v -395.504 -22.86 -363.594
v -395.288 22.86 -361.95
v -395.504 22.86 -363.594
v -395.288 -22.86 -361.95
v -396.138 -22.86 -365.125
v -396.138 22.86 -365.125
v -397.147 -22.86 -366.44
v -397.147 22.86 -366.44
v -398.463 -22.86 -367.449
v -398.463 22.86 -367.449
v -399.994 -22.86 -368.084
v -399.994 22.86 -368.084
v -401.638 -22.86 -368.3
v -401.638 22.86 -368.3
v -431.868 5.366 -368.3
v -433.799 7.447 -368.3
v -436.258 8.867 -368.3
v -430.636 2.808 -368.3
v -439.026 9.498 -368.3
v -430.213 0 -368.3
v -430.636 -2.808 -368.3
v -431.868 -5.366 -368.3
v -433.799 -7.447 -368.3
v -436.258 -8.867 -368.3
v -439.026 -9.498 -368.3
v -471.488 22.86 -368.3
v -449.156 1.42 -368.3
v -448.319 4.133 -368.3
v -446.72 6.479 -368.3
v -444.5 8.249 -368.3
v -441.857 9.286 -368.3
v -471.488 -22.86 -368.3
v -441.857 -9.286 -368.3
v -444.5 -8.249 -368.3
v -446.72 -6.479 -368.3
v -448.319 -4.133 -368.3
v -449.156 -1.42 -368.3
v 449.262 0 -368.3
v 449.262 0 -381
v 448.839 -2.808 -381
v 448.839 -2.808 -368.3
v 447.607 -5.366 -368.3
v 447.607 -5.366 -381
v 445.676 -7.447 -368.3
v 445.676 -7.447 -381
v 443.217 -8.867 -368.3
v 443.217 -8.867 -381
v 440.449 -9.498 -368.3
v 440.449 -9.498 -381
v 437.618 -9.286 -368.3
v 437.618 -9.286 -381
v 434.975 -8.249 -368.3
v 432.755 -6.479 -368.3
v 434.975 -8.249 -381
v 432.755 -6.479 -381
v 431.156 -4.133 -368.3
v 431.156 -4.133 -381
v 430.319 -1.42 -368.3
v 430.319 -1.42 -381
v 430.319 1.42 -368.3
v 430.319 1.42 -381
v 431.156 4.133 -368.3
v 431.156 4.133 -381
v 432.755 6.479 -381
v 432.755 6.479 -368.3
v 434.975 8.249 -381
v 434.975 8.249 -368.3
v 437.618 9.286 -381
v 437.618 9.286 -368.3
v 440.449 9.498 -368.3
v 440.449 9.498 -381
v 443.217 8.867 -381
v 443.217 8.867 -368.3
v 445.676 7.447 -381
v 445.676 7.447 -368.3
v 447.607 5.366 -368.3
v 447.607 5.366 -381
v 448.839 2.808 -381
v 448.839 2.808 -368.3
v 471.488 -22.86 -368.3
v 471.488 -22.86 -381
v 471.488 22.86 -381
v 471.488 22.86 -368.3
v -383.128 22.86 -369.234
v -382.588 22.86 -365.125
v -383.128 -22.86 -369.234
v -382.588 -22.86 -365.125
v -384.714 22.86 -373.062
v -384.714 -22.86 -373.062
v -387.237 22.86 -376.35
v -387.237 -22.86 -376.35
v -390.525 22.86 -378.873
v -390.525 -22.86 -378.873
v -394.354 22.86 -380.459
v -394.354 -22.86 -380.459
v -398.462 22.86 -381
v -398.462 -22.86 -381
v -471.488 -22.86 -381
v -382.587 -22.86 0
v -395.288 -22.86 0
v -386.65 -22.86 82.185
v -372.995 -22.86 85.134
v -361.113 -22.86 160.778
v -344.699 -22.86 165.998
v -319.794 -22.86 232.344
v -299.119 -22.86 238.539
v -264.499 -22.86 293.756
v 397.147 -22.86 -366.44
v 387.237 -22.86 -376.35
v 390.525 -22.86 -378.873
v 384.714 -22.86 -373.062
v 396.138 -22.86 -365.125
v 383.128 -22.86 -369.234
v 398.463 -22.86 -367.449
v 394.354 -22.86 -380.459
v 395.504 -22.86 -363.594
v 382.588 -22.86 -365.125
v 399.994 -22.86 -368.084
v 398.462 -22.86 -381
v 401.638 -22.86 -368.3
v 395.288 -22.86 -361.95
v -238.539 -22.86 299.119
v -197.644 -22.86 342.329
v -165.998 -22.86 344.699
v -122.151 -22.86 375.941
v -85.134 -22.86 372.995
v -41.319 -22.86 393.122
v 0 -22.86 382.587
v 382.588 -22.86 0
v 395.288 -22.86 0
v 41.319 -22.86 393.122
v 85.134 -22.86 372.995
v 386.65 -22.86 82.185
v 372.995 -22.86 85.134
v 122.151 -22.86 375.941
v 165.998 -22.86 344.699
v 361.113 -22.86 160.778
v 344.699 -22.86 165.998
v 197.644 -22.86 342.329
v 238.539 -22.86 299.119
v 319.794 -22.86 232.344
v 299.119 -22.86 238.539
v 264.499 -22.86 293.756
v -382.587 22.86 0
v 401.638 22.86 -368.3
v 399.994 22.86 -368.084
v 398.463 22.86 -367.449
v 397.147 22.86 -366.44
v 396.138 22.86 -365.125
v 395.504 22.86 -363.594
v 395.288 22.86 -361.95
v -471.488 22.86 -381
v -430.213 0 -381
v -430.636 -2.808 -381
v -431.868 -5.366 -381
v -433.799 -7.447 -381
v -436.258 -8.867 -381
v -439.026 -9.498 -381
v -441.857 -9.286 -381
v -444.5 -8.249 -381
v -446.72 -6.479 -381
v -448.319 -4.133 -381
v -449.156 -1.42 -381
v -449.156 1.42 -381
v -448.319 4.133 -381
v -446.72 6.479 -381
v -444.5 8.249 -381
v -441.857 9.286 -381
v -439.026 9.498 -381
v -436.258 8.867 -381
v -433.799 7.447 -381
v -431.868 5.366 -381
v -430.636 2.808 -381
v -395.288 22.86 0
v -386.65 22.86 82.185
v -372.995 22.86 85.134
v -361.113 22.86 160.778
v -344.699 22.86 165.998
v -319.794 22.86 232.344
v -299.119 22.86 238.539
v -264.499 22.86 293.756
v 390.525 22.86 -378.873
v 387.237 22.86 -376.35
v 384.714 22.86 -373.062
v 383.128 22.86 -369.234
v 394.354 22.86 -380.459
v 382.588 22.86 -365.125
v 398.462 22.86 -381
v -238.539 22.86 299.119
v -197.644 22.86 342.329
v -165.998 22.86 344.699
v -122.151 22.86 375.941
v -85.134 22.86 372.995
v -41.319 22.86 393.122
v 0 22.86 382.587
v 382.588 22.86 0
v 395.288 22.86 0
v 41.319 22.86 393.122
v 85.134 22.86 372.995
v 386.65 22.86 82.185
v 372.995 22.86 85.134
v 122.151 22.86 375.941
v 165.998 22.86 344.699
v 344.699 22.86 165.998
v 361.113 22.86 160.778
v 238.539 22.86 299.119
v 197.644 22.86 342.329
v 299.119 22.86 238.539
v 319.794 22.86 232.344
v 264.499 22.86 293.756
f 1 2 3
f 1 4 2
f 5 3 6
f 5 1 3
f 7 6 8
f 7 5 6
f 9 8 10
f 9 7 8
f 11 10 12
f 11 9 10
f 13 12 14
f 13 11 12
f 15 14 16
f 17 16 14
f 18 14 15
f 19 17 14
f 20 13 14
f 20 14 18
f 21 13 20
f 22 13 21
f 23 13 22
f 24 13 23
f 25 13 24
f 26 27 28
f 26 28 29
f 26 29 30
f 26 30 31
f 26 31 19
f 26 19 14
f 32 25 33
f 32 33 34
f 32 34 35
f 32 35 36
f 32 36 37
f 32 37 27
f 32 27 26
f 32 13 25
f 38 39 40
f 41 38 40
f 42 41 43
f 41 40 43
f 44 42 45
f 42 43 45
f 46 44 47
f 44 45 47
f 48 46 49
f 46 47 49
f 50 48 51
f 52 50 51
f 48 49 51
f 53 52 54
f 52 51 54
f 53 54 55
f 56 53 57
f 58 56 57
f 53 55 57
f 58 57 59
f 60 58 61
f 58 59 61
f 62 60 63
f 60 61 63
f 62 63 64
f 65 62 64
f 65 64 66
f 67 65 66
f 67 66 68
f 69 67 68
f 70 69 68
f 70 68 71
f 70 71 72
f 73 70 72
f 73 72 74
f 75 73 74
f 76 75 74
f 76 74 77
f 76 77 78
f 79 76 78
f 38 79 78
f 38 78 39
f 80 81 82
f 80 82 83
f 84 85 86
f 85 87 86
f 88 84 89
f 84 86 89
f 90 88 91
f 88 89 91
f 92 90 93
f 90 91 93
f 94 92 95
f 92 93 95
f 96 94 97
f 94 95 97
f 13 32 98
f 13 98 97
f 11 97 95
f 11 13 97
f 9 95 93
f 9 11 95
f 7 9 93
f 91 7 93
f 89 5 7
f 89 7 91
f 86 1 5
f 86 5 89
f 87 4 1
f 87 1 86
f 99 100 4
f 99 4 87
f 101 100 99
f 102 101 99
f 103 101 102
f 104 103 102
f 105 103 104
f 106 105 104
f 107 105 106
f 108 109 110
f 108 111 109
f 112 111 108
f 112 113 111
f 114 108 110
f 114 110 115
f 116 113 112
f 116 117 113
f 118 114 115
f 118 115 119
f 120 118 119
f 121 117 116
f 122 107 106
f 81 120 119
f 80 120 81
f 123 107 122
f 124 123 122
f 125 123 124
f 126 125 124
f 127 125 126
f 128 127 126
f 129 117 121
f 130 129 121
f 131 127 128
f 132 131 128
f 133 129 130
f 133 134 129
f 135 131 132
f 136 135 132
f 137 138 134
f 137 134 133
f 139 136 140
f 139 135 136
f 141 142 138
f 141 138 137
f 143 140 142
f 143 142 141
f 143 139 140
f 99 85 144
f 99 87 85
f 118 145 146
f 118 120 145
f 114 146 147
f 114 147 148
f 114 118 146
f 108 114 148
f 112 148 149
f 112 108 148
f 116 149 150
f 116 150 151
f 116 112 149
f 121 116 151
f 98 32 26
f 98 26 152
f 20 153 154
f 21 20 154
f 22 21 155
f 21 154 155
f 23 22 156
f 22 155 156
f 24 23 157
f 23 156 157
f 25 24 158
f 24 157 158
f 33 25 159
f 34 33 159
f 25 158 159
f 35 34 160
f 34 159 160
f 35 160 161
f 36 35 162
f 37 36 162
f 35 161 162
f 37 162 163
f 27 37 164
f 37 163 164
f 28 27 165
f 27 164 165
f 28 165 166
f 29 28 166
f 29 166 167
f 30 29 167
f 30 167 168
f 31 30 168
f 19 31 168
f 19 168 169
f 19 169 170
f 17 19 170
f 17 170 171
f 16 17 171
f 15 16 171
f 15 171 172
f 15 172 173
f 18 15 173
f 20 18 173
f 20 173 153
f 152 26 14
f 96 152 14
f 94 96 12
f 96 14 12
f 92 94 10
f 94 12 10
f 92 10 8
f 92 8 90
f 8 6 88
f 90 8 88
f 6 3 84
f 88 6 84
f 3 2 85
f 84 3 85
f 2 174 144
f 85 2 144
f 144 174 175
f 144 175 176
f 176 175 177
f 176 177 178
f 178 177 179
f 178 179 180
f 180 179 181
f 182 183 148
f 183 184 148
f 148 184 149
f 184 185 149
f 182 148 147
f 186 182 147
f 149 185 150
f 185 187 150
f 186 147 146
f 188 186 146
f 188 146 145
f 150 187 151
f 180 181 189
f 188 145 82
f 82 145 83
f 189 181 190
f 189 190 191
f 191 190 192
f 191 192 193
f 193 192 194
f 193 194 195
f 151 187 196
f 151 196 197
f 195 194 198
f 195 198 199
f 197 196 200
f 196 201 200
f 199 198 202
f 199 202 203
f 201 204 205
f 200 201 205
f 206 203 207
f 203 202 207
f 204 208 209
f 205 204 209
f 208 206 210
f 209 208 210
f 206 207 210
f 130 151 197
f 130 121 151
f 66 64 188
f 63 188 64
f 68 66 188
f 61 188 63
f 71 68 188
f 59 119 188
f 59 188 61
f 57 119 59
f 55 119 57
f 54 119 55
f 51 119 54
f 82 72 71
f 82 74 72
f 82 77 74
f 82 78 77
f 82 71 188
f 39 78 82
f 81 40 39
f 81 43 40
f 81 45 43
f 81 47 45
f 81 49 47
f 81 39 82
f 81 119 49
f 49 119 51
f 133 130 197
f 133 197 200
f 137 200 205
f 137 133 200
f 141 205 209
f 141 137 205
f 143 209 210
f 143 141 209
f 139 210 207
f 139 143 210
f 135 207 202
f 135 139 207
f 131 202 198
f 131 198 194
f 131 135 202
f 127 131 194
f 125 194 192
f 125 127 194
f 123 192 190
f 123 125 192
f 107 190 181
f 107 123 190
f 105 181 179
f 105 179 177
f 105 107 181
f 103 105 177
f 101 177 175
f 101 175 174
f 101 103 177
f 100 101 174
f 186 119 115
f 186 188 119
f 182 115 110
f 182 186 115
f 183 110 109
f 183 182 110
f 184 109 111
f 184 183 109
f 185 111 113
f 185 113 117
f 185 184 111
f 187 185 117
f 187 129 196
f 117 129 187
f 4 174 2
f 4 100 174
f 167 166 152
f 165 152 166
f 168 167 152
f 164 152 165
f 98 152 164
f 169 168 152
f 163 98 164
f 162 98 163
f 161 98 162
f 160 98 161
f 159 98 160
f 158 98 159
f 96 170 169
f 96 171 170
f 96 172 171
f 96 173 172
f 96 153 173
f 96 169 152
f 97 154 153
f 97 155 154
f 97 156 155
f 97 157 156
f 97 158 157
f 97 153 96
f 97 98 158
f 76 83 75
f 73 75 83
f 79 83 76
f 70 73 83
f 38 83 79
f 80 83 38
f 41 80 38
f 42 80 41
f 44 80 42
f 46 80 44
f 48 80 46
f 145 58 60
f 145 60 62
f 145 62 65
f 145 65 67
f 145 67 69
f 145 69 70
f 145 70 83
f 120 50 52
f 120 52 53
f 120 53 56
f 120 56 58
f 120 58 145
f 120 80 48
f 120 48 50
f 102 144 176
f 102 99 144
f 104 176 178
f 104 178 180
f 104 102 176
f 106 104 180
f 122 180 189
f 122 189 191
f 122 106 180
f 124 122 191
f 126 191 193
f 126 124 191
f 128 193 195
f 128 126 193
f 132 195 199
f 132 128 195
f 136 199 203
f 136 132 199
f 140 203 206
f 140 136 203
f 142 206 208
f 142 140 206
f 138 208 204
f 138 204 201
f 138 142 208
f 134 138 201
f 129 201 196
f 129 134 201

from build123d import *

# Parameters (mm, degrees)
F1_DEPTH = 22.86
F2_R     = 9.525
F3_DEPTH = 25.4
F4_R     = 6.35
F5_R     = 15.875


with BuildPart() as f1:
    # F0 (on Front) → F1 (new body, symmetric)
    with BuildSketch(Plane.XZ):
        with BuildLine():
            Line((382.5875, -381), (471.4875, -381))
            Line((471.4875, -381), (471.4875, -368.3))
            Line((471.4875, -368.3), (395.2875, -368.3))
            Line((395.2875, -368.3), (395.2875, 0))
            ThreePointArc((395.2875, 0), (0, 395.2875), (-395.2875, 0))
            Line((-395.2875, 0), (-395.2875, -368.3))
            Line((-395.2875, -368.3), (-471.4875, -368.3))
            Line((-471.4875, -368.3), (-471.4875, -381))
            Line((-471.4875, -381), (-382.5875, -381))
            Line((-382.5875, -381), (-382.5875, 0))
            ThreePointArc((-382.5875, 0), (0, 382.5875), (382.5875, 0))
            Line((382.5875, 0), (382.5875, -381))
        make_face()
    extrude(amount=F1_DEPTH, both=True)

    # F2 (on face) → F3 (cut)
    with BuildSketch(Plane(origin=(0, 0, -381), x_dir=(1, 0, 0), z_dir=(0, 0, -1))):
        with Locations((-439.7375, 0)):
            Circle(F2_R)
        with Locations((439.7375, 0)):
            Circle(F2_R)
    extrude(amount=-F3_DEPTH, mode=Mode.SUBTRACT)

    # F4
    f4_edges = [f1.edges().sort_by_distance(p)[0] for p in [
        (-395.2875, 0, -368.3),
        (395.2875, 0, -368.3),
    ]]
    fillet(f4_edges, radius=F4_R)

    # F5
    f5_edges = [f1.edges().sort_by_distance(p)[0] for p in [
        (-382.5875, 0, -381),
        (382.5875, 0, -381),
    ]]
    fillet(f5_edges, radius=F5_R)


solid = f1.part
